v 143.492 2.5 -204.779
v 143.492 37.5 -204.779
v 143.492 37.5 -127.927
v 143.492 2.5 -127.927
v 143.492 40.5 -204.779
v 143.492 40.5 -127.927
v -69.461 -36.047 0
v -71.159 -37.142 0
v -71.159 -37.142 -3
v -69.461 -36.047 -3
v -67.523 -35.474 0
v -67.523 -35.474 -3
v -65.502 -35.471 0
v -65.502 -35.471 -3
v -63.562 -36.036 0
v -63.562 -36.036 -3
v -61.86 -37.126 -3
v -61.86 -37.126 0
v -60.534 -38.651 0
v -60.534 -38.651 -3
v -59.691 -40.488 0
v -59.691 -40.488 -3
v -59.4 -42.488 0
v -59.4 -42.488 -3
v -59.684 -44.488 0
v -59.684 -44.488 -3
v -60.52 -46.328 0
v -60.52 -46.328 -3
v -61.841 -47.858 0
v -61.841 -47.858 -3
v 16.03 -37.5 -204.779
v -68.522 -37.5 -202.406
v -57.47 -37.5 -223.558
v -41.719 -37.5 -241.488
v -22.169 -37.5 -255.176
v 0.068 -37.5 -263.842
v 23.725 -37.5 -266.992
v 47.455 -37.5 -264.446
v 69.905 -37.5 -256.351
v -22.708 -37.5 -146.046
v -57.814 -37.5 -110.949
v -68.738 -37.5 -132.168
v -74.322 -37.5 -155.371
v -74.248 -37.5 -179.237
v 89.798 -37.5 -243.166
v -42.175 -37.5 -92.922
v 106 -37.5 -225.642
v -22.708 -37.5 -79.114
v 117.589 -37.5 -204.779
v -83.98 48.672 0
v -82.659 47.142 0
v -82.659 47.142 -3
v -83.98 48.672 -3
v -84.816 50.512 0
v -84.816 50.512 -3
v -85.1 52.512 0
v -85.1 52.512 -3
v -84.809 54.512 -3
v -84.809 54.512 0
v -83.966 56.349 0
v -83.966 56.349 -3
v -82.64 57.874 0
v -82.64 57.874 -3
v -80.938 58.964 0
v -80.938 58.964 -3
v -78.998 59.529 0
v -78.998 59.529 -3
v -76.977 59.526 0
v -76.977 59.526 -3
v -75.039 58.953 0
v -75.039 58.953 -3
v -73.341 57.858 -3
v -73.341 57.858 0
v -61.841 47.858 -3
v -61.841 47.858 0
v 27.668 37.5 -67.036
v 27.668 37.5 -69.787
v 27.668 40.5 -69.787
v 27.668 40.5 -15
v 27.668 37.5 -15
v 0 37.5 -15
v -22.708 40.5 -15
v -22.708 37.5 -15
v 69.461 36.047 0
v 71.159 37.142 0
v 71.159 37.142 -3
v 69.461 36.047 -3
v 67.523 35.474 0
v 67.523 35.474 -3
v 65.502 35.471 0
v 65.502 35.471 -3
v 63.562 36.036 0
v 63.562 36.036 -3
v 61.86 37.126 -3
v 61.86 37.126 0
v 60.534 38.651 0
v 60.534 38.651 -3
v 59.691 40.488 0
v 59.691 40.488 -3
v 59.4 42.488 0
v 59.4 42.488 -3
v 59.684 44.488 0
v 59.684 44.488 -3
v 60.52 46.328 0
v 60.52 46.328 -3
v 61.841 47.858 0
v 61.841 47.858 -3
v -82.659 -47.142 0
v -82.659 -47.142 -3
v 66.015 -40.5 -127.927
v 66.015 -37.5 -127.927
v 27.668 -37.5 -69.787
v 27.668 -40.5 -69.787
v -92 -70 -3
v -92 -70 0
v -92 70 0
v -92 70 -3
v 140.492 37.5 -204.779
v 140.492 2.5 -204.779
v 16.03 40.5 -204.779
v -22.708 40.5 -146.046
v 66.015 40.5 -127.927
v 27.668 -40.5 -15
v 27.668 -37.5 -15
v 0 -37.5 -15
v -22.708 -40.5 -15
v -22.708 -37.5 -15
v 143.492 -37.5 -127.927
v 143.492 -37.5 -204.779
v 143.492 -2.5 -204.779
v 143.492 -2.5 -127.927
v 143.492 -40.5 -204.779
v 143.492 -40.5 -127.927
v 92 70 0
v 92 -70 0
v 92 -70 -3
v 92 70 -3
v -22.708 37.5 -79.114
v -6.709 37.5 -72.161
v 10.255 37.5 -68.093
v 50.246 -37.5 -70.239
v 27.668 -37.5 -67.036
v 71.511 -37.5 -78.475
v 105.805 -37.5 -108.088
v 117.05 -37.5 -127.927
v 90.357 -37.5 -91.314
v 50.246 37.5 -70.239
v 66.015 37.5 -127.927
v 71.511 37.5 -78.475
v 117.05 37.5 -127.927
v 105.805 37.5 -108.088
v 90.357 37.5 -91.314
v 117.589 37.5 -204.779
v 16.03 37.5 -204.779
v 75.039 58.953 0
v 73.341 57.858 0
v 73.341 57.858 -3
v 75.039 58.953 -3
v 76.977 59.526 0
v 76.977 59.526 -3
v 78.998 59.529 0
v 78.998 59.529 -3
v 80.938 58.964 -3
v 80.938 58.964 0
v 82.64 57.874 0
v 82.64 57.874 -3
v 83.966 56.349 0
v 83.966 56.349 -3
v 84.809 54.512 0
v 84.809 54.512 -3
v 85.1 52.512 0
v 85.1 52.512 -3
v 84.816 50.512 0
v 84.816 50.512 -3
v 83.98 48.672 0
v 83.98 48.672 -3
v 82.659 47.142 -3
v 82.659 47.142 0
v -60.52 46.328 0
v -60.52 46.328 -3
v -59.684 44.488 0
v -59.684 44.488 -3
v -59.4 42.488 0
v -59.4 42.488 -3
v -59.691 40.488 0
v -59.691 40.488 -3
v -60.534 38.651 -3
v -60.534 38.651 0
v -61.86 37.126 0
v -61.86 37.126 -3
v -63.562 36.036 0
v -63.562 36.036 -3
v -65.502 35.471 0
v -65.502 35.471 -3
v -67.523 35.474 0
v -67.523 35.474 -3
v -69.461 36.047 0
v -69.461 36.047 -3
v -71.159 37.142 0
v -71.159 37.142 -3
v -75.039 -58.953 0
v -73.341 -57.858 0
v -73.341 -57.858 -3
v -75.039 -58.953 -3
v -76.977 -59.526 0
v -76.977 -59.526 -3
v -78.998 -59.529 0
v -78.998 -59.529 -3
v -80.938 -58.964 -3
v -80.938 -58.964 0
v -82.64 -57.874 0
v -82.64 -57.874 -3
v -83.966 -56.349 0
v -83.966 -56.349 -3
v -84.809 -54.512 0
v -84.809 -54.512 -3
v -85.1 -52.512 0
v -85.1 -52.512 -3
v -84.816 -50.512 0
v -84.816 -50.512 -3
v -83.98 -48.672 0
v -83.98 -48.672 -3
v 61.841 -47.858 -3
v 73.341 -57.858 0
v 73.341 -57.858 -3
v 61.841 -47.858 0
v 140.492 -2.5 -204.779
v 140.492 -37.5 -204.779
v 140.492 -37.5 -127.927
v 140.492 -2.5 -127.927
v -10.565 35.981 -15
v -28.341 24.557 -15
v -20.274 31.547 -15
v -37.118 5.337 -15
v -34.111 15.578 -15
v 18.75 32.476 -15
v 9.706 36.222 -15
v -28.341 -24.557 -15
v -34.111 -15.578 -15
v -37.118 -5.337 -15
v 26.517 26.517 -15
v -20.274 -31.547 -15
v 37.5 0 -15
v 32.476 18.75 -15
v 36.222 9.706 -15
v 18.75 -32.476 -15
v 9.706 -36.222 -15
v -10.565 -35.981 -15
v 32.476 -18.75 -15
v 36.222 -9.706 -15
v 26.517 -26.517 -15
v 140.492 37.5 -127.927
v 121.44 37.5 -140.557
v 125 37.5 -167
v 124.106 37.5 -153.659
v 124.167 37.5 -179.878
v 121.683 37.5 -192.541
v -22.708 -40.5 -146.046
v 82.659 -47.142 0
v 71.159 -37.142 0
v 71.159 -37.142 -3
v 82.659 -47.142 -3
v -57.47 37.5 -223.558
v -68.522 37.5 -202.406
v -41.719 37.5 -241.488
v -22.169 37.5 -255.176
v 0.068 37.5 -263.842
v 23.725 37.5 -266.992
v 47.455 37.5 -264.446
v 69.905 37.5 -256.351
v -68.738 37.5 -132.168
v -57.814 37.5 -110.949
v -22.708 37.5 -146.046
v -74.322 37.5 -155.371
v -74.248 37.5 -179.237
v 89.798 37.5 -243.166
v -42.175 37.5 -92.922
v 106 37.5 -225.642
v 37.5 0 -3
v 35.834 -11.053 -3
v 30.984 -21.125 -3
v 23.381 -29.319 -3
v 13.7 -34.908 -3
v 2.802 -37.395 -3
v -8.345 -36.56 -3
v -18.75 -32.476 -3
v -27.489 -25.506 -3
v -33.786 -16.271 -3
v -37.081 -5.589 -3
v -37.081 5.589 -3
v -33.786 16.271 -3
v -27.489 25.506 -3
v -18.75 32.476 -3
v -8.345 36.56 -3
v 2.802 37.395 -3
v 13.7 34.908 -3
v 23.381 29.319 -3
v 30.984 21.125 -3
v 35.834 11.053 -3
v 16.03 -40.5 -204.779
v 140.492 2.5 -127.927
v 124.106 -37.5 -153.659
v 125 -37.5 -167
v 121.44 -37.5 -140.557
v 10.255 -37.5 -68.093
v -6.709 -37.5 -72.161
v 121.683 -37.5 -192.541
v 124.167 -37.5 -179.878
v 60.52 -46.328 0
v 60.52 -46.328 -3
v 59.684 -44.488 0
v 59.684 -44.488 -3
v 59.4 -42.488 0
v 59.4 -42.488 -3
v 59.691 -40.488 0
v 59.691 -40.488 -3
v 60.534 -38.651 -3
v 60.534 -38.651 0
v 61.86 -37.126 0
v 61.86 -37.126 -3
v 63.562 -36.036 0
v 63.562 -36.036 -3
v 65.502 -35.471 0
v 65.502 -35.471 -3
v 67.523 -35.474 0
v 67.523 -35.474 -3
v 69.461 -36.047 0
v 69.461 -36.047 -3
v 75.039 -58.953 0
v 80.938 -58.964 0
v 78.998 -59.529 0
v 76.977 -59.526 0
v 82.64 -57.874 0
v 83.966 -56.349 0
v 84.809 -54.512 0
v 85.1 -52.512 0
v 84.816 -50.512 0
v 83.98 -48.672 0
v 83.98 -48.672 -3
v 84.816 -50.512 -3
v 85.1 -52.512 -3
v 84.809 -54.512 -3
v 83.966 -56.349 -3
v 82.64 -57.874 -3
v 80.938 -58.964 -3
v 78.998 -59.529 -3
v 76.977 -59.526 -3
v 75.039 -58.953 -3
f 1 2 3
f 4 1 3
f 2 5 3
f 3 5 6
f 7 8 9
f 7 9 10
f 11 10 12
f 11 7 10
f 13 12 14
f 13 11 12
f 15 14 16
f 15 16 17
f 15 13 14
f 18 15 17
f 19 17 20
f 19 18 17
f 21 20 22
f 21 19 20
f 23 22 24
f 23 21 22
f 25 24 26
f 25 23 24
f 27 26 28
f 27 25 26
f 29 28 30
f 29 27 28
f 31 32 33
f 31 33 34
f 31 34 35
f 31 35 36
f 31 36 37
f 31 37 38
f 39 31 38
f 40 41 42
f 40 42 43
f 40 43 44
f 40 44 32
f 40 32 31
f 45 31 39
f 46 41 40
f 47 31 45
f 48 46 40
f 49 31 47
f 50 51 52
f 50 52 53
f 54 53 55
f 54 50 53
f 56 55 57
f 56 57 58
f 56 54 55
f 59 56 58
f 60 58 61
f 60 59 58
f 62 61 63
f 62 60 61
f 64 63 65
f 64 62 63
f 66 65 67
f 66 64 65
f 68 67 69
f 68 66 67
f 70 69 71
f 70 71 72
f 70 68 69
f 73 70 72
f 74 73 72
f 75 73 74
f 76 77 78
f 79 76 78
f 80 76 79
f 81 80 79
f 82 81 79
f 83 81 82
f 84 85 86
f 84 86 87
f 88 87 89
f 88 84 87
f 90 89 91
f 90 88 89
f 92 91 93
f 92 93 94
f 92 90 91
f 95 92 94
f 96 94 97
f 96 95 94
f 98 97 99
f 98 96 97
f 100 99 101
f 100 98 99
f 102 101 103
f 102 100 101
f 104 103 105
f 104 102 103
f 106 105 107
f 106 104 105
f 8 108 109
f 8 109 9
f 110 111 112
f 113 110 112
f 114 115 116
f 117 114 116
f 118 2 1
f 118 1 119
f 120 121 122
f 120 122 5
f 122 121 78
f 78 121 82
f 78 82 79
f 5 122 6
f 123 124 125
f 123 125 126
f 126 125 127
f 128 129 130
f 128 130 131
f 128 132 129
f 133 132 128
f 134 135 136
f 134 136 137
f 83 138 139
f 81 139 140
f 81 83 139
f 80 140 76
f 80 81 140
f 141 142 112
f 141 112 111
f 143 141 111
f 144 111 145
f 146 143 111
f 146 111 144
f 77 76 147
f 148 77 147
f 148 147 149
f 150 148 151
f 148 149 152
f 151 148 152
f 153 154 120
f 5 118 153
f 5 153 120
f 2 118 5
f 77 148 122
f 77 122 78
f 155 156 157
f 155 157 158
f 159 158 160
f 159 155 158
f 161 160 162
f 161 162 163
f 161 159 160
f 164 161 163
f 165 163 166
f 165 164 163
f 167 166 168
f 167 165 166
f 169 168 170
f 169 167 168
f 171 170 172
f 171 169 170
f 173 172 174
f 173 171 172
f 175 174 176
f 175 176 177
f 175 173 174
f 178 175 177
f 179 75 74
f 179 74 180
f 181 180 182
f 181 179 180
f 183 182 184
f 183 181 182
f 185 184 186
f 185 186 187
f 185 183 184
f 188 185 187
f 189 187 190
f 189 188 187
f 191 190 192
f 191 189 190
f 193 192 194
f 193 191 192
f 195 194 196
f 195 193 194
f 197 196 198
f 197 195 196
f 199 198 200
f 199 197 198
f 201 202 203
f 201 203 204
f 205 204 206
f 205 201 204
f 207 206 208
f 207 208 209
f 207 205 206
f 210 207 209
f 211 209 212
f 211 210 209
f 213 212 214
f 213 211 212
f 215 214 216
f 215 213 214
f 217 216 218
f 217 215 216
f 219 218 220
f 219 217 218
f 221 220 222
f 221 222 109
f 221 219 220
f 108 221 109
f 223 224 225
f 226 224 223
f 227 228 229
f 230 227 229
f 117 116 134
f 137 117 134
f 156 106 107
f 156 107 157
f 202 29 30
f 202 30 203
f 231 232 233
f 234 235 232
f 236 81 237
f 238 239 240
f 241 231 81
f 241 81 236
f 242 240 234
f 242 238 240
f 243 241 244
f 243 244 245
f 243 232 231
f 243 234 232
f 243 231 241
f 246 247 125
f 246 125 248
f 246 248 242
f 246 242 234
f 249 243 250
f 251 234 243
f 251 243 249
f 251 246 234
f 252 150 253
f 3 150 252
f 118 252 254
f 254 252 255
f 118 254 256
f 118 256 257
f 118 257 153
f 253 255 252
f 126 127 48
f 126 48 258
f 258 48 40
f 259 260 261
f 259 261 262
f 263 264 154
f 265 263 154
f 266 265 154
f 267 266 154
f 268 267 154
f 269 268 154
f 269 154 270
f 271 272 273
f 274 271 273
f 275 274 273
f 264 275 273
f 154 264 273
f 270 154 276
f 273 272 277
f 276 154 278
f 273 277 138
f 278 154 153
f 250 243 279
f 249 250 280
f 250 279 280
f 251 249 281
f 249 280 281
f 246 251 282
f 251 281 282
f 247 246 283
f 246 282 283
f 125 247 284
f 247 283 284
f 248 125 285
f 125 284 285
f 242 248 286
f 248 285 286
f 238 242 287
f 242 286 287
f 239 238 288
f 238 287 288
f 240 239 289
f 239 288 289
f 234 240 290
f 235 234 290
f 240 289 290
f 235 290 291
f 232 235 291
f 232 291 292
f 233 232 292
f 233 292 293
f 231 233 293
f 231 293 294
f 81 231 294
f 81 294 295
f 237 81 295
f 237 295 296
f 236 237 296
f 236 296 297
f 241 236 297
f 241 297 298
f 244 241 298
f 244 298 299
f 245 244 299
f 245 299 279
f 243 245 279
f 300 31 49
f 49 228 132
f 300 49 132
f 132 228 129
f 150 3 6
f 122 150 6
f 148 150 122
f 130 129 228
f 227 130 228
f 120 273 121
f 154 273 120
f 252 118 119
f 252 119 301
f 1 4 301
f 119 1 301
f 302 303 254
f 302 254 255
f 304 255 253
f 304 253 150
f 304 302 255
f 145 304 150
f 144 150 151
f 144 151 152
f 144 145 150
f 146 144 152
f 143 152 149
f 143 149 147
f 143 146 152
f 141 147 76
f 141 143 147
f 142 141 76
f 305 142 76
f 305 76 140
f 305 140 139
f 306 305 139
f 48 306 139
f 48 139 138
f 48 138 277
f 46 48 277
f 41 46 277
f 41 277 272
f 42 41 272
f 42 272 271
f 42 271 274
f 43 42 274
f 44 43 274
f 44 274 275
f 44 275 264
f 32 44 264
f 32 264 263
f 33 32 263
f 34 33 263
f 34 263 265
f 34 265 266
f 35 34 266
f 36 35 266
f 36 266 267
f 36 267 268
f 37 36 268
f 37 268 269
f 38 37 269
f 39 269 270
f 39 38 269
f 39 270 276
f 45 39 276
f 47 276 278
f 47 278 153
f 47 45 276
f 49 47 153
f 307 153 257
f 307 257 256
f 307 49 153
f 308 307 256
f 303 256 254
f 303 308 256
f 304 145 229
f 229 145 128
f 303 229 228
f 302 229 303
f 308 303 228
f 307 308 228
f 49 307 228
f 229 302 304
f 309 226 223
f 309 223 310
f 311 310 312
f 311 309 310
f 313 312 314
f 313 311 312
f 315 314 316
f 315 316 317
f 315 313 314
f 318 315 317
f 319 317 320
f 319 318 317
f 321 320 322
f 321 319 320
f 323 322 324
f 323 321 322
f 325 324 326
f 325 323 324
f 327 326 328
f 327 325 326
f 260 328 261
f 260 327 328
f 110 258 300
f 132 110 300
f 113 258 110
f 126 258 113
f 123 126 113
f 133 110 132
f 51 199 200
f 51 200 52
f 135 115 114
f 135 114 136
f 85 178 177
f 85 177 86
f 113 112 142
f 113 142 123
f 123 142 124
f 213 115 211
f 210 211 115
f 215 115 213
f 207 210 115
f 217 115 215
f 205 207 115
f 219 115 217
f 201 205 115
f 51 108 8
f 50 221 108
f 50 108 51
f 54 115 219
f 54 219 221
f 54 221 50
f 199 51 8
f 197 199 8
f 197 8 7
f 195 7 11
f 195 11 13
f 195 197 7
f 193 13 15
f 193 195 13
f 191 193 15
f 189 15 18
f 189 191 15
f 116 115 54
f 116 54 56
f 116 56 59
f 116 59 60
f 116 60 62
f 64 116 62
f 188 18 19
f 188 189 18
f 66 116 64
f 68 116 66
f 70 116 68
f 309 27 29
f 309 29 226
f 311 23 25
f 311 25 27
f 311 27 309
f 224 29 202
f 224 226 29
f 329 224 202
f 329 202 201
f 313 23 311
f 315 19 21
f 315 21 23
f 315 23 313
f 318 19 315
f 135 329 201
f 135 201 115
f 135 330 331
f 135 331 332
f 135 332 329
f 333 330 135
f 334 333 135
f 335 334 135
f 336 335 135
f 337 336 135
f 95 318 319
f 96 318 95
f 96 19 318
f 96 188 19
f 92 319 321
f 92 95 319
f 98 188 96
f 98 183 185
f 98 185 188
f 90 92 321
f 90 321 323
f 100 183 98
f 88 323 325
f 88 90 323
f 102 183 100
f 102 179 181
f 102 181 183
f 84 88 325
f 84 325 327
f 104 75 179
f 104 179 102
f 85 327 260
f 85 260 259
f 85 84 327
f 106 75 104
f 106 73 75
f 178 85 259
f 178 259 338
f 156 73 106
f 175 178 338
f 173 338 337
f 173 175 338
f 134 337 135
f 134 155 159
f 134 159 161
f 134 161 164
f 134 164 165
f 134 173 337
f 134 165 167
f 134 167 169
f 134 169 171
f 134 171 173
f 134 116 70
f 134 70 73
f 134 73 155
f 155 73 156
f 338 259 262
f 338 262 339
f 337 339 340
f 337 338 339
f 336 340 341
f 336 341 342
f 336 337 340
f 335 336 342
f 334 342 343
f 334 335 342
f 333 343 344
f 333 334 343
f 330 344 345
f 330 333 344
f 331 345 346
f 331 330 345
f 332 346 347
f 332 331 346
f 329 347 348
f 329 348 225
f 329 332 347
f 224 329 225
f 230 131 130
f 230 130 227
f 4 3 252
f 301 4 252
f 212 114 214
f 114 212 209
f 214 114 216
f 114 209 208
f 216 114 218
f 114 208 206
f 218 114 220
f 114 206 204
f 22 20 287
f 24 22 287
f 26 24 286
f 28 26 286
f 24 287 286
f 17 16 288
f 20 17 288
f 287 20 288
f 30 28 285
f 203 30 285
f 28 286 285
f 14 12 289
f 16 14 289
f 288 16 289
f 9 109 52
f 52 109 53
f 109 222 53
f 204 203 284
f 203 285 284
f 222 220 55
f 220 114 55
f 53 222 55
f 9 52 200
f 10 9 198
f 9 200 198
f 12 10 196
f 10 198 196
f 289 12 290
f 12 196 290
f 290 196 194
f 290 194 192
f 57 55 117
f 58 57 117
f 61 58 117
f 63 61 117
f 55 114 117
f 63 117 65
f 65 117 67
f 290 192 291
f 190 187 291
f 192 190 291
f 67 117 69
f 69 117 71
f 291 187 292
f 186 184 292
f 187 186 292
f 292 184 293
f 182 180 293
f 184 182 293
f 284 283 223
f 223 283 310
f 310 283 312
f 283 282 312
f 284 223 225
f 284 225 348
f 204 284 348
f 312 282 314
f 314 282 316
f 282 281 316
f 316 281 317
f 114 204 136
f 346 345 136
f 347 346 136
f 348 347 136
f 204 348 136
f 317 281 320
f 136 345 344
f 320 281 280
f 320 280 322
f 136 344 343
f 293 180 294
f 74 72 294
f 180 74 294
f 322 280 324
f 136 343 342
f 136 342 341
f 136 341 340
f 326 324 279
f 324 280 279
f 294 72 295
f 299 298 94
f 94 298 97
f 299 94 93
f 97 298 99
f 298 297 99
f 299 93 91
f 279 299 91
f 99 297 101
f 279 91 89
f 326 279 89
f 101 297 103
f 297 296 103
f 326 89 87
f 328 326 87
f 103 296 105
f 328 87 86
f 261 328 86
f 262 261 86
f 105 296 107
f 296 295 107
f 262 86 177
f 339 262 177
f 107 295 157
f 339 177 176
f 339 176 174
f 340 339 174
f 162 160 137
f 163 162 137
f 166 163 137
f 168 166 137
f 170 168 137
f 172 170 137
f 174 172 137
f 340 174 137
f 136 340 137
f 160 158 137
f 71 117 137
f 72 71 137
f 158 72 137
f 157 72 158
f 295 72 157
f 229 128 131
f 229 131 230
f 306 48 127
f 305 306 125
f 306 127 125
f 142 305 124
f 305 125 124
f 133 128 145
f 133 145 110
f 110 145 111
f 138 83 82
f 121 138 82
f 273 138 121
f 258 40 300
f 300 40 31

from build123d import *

# Parameters (mm, degrees)
F0_W      = 184
F0_H      = 140
F1_DEPTH  = 3
F2_R      = 37.5
F3_DEPTH  = 12
F6_R      = 100
F7_DEPTH  = 37.5
F9_DEPTH  = 3
F10_W     = 3
F10_H     = 76.852187
F11_DEPTH = 35


with BuildPart() as f1:
    # F0 (on Top) → F1 (new body)
    with BuildSketch(Plane.XY):
        Rectangle(F0_W, F0_H)
        with BuildLine():
            ThreePointArc((-71.158869, -37.142301), (-61.142301, -37.841131), (-61.841131, -47.857699))
            Line((-61.841131, -47.857699), (-73.341131, -57.857699))
            ThreePointArc((-73.341131, -57.857699), (-83.357699, -57.158869), (-82.658869, -47.142301))
            Line((-82.658869, -47.142301), (-71.158869, -37.142301))
        make_face(mode=Mode.SUBTRACT)
        with BuildLine():
            ThreePointArc((61.841131, -47.857699), (61.142301, -37.841131), (71.158869, -37.142301))
            Line((71.158869, -37.142301), (82.658869, -47.142301))
            ThreePointArc((82.658869, -47.142301), (83.357699, -57.158869), (73.341131, -57.857699))
            Line((73.341131, -57.857699), (61.841131, -47.857699))
        make_face(mode=Mode.SUBTRACT)
        with BuildLine():
            ThreePointArc((-82.658869, 47.142301), (-83.357699, 57.158869), (-73.341131, 57.857699))
            Line((-73.341131, 57.857699), (-61.841131, 47.857699))
            ThreePointArc((-61.841131, 47.857699), (-61.142301, 37.841131), (-71.158869, 37.142301))
            Line((-71.158869, 37.142301), (-82.658869, 47.142301))
        make_face(mode=Mode.SUBTRACT)
        with BuildLine():
            ThreePointArc((73.341131, 57.857699), (83.357699, 57.158869), (82.658869, 47.142301))
            Line((82.658869, 47.142301), (71.158869, 37.142301))
            ThreePointArc((71.158869, 37.142301), (61.142301, 37.841131), (61.841131, 47.857699))
            Line((61.841131, 47.857699), (73.341131, 57.857699))
        make_face(mode=Mode.SUBTRACT)
    extrude(amount=-F1_DEPTH)

    # F2 (on face) → F3 (join)
    with BuildSketch(Plane(origin=(0, 0, -3), x_dir=(1, 0, 0), z_dir=(0, 0, -1))):
        Circle(F2_R)
    extrude(amount=F3_DEPTH)



with BuildPart() as f7:
    # F6 (on Front) → F7 (new body, symmetric)
    with BuildSketch(Plane.XZ):
        with Locations((25, -167)):
            Circle(F6_R)
    extrude(amount=F7_DEPTH, both=True)


with BuildPart() as f1_1:
    add(f1.part)

    add(f7.part)  # F9 merges F7
    # F8 (on face) → F9 (join)
    with BuildSketch(Plane.XZ.offset(37.5)):
        Polygon((27.667802, -15), (-22.708422, -15), (-22.708422, -146.046415), (16.030081, -204.778984), (143.492267, -204.778984), (143.492267, -127.926797), (66.015258, -127.926797), (27.667802, -69.787103), align=None)
    extrude(amount=F9_DEPTH)

    # F10 (on face) → F11 (join)
    with BuildSketch(Plane(origin=(0, -37.5, 0), x_dir=(-1, 0, 0), z_dir=(0, 1, 0))):
        with Locations((-141.992267, -166.352891)):
            Rectangle(F10_W, F10_H)
    extrude(amount=F11_DEPTH)

    # F12: F1 across plane


with BuildPart() as f1_2:
    add(f1_1.part)
    add(f1_1.part.mirror(Plane.XZ))


solid = f1_2.part
